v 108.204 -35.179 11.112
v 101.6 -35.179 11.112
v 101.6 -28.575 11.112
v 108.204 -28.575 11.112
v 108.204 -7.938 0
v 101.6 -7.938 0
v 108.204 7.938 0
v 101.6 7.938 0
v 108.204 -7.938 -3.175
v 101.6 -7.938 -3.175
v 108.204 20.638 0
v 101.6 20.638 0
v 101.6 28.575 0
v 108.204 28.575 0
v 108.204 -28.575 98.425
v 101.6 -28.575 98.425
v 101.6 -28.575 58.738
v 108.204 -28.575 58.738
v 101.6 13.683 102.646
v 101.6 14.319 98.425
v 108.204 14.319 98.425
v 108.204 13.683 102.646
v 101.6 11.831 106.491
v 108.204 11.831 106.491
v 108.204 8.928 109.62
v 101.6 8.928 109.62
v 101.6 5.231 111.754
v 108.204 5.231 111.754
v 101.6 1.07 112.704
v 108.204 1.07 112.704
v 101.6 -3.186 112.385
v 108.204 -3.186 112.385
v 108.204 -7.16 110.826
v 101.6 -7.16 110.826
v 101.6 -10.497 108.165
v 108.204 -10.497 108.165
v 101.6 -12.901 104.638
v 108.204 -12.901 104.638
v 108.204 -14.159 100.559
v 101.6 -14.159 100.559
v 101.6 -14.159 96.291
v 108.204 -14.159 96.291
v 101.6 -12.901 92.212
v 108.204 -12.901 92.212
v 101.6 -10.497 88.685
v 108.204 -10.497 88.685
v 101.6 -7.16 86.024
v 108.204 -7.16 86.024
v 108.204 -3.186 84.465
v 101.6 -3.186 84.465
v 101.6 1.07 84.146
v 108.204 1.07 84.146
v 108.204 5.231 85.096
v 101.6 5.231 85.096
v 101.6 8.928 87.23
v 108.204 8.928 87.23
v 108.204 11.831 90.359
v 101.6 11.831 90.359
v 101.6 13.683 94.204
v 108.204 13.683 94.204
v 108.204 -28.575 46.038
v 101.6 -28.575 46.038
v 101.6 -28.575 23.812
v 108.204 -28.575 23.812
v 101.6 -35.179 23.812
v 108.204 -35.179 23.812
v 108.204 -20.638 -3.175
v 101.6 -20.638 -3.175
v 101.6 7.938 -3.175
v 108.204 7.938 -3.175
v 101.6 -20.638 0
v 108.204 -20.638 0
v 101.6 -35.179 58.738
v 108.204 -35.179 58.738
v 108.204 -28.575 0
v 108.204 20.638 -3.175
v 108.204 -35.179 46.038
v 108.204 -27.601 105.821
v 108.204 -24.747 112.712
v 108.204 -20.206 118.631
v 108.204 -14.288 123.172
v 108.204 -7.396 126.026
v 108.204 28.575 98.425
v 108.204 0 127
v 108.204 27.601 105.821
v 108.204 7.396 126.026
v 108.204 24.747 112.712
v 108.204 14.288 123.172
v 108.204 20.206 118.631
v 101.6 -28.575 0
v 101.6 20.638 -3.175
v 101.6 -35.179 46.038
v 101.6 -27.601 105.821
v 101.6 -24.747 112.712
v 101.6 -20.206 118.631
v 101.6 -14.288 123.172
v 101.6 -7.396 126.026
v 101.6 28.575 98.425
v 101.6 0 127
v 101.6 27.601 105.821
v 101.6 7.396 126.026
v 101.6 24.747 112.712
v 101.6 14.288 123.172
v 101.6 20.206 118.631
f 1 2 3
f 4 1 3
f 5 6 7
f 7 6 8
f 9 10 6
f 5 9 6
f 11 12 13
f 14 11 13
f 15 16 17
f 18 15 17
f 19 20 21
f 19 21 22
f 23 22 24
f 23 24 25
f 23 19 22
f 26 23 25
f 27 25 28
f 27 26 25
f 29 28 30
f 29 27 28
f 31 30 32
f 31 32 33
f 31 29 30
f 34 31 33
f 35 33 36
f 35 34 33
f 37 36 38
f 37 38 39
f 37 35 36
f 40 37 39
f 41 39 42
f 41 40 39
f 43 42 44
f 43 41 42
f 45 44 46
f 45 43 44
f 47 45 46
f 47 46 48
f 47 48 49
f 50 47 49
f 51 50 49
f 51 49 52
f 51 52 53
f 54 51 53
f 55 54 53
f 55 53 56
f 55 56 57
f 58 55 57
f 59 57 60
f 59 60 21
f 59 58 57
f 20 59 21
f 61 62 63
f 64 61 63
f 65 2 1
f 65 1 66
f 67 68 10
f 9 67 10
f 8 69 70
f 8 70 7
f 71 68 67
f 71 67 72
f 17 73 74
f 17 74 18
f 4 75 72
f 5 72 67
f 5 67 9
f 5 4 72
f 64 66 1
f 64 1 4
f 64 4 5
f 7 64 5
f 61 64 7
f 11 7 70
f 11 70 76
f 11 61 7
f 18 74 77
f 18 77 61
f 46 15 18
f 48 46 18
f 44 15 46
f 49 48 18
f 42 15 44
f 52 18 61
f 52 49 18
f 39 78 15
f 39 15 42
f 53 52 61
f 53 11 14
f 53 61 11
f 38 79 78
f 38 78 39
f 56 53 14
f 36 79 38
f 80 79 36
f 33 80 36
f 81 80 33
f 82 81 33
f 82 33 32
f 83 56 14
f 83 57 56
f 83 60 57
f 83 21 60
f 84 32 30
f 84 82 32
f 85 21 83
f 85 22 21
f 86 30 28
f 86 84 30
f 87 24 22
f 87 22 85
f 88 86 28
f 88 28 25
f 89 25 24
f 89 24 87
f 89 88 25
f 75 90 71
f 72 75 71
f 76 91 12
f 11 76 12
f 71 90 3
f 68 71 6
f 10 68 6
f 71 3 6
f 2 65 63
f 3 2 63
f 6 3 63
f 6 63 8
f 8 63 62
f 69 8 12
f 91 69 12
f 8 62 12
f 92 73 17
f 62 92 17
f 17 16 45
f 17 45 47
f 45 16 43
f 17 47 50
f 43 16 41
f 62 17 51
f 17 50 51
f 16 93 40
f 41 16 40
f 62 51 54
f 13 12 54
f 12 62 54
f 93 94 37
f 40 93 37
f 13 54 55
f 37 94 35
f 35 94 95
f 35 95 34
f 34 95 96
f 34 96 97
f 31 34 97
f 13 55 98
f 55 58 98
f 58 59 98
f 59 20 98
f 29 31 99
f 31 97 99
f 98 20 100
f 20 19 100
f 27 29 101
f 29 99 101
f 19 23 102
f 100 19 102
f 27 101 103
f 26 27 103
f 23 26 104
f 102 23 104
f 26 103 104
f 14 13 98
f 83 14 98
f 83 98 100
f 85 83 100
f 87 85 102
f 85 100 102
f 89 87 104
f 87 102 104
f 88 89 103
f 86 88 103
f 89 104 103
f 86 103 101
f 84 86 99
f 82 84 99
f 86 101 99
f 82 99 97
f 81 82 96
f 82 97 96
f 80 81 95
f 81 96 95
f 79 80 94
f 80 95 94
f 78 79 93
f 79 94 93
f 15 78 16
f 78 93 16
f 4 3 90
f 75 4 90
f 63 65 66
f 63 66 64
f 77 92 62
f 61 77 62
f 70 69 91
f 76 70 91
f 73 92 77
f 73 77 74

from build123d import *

# Parameters (mm, degrees)
F1_R     = 14.31925
F1_W     = 12.7
F1_H     = 3.175
F1_W_2   = 6.604
F1_H_2   = 12.7
F2_DEPTH = 6.604


with BuildPart() as f2:
    # F1 (on offset) → F2 (new body)
    with BuildSketch(Plane.YZ.offset(101.6)):
        Polygon((28.575, 0), (28.575, 69.85), (0, 69.85), (-28.575, 69.85), (-28.575, 58.7375), (-28.575, 46.0375), (-28.575, 23.8125), (-28.575, 11.1125), (-28.575, 0), (-20.6375, 0), (-7.9375, 0), (7.9375, 0), (20.6375, 0), align=None)
        with BuildLine():
            Line((0, 69.85), (28.575, 69.85))
            Line((28.575, 69.85), (28.575, 98.425))
            ThreePointArc((28.575, 98.425), (20.205576, 78.219424), (0, 69.85))
        make_face()
        with BuildLine():
            Line((-28.575, 69.85), (0, 69.85))
            ThreePointArc((0, 69.85), (-20.205576, 78.219424), (-28.575, 98.425))
            Line((-28.575, 98.425), (-28.575, 69.85))
        make_face()
        with BuildLine():
            ThreePointArc((-28.575, 98.425), (-20.205576, 78.219424), (0, 69.85))
            ThreePointArc((0, 69.85), (20.205576, 78.219424), (28.575, 98.425))
            ThreePointArc((28.575, 98.425), (0, 127), (-28.575, 98.425))
        make_face()
        with Locations((0, 98.425)):
            Circle(F1_R, mode=Mode.SUBTRACT)
        with Locations((14.2875, -1.5875)):
            Rectangle(F1_W, F1_H)
        with Locations((-31.877, 52.3875)):
            Rectangle(F1_W_2, F1_H_2)
        with Locations((-14.2875, -1.5875)):
            Rectangle(F1_W, F1_H)
        with Locations((-31.877, 17.4625)):
            Rectangle(F1_W_2, F1_H_2)
    extrude(amount=F2_DEPTH)


solid = f2.part
